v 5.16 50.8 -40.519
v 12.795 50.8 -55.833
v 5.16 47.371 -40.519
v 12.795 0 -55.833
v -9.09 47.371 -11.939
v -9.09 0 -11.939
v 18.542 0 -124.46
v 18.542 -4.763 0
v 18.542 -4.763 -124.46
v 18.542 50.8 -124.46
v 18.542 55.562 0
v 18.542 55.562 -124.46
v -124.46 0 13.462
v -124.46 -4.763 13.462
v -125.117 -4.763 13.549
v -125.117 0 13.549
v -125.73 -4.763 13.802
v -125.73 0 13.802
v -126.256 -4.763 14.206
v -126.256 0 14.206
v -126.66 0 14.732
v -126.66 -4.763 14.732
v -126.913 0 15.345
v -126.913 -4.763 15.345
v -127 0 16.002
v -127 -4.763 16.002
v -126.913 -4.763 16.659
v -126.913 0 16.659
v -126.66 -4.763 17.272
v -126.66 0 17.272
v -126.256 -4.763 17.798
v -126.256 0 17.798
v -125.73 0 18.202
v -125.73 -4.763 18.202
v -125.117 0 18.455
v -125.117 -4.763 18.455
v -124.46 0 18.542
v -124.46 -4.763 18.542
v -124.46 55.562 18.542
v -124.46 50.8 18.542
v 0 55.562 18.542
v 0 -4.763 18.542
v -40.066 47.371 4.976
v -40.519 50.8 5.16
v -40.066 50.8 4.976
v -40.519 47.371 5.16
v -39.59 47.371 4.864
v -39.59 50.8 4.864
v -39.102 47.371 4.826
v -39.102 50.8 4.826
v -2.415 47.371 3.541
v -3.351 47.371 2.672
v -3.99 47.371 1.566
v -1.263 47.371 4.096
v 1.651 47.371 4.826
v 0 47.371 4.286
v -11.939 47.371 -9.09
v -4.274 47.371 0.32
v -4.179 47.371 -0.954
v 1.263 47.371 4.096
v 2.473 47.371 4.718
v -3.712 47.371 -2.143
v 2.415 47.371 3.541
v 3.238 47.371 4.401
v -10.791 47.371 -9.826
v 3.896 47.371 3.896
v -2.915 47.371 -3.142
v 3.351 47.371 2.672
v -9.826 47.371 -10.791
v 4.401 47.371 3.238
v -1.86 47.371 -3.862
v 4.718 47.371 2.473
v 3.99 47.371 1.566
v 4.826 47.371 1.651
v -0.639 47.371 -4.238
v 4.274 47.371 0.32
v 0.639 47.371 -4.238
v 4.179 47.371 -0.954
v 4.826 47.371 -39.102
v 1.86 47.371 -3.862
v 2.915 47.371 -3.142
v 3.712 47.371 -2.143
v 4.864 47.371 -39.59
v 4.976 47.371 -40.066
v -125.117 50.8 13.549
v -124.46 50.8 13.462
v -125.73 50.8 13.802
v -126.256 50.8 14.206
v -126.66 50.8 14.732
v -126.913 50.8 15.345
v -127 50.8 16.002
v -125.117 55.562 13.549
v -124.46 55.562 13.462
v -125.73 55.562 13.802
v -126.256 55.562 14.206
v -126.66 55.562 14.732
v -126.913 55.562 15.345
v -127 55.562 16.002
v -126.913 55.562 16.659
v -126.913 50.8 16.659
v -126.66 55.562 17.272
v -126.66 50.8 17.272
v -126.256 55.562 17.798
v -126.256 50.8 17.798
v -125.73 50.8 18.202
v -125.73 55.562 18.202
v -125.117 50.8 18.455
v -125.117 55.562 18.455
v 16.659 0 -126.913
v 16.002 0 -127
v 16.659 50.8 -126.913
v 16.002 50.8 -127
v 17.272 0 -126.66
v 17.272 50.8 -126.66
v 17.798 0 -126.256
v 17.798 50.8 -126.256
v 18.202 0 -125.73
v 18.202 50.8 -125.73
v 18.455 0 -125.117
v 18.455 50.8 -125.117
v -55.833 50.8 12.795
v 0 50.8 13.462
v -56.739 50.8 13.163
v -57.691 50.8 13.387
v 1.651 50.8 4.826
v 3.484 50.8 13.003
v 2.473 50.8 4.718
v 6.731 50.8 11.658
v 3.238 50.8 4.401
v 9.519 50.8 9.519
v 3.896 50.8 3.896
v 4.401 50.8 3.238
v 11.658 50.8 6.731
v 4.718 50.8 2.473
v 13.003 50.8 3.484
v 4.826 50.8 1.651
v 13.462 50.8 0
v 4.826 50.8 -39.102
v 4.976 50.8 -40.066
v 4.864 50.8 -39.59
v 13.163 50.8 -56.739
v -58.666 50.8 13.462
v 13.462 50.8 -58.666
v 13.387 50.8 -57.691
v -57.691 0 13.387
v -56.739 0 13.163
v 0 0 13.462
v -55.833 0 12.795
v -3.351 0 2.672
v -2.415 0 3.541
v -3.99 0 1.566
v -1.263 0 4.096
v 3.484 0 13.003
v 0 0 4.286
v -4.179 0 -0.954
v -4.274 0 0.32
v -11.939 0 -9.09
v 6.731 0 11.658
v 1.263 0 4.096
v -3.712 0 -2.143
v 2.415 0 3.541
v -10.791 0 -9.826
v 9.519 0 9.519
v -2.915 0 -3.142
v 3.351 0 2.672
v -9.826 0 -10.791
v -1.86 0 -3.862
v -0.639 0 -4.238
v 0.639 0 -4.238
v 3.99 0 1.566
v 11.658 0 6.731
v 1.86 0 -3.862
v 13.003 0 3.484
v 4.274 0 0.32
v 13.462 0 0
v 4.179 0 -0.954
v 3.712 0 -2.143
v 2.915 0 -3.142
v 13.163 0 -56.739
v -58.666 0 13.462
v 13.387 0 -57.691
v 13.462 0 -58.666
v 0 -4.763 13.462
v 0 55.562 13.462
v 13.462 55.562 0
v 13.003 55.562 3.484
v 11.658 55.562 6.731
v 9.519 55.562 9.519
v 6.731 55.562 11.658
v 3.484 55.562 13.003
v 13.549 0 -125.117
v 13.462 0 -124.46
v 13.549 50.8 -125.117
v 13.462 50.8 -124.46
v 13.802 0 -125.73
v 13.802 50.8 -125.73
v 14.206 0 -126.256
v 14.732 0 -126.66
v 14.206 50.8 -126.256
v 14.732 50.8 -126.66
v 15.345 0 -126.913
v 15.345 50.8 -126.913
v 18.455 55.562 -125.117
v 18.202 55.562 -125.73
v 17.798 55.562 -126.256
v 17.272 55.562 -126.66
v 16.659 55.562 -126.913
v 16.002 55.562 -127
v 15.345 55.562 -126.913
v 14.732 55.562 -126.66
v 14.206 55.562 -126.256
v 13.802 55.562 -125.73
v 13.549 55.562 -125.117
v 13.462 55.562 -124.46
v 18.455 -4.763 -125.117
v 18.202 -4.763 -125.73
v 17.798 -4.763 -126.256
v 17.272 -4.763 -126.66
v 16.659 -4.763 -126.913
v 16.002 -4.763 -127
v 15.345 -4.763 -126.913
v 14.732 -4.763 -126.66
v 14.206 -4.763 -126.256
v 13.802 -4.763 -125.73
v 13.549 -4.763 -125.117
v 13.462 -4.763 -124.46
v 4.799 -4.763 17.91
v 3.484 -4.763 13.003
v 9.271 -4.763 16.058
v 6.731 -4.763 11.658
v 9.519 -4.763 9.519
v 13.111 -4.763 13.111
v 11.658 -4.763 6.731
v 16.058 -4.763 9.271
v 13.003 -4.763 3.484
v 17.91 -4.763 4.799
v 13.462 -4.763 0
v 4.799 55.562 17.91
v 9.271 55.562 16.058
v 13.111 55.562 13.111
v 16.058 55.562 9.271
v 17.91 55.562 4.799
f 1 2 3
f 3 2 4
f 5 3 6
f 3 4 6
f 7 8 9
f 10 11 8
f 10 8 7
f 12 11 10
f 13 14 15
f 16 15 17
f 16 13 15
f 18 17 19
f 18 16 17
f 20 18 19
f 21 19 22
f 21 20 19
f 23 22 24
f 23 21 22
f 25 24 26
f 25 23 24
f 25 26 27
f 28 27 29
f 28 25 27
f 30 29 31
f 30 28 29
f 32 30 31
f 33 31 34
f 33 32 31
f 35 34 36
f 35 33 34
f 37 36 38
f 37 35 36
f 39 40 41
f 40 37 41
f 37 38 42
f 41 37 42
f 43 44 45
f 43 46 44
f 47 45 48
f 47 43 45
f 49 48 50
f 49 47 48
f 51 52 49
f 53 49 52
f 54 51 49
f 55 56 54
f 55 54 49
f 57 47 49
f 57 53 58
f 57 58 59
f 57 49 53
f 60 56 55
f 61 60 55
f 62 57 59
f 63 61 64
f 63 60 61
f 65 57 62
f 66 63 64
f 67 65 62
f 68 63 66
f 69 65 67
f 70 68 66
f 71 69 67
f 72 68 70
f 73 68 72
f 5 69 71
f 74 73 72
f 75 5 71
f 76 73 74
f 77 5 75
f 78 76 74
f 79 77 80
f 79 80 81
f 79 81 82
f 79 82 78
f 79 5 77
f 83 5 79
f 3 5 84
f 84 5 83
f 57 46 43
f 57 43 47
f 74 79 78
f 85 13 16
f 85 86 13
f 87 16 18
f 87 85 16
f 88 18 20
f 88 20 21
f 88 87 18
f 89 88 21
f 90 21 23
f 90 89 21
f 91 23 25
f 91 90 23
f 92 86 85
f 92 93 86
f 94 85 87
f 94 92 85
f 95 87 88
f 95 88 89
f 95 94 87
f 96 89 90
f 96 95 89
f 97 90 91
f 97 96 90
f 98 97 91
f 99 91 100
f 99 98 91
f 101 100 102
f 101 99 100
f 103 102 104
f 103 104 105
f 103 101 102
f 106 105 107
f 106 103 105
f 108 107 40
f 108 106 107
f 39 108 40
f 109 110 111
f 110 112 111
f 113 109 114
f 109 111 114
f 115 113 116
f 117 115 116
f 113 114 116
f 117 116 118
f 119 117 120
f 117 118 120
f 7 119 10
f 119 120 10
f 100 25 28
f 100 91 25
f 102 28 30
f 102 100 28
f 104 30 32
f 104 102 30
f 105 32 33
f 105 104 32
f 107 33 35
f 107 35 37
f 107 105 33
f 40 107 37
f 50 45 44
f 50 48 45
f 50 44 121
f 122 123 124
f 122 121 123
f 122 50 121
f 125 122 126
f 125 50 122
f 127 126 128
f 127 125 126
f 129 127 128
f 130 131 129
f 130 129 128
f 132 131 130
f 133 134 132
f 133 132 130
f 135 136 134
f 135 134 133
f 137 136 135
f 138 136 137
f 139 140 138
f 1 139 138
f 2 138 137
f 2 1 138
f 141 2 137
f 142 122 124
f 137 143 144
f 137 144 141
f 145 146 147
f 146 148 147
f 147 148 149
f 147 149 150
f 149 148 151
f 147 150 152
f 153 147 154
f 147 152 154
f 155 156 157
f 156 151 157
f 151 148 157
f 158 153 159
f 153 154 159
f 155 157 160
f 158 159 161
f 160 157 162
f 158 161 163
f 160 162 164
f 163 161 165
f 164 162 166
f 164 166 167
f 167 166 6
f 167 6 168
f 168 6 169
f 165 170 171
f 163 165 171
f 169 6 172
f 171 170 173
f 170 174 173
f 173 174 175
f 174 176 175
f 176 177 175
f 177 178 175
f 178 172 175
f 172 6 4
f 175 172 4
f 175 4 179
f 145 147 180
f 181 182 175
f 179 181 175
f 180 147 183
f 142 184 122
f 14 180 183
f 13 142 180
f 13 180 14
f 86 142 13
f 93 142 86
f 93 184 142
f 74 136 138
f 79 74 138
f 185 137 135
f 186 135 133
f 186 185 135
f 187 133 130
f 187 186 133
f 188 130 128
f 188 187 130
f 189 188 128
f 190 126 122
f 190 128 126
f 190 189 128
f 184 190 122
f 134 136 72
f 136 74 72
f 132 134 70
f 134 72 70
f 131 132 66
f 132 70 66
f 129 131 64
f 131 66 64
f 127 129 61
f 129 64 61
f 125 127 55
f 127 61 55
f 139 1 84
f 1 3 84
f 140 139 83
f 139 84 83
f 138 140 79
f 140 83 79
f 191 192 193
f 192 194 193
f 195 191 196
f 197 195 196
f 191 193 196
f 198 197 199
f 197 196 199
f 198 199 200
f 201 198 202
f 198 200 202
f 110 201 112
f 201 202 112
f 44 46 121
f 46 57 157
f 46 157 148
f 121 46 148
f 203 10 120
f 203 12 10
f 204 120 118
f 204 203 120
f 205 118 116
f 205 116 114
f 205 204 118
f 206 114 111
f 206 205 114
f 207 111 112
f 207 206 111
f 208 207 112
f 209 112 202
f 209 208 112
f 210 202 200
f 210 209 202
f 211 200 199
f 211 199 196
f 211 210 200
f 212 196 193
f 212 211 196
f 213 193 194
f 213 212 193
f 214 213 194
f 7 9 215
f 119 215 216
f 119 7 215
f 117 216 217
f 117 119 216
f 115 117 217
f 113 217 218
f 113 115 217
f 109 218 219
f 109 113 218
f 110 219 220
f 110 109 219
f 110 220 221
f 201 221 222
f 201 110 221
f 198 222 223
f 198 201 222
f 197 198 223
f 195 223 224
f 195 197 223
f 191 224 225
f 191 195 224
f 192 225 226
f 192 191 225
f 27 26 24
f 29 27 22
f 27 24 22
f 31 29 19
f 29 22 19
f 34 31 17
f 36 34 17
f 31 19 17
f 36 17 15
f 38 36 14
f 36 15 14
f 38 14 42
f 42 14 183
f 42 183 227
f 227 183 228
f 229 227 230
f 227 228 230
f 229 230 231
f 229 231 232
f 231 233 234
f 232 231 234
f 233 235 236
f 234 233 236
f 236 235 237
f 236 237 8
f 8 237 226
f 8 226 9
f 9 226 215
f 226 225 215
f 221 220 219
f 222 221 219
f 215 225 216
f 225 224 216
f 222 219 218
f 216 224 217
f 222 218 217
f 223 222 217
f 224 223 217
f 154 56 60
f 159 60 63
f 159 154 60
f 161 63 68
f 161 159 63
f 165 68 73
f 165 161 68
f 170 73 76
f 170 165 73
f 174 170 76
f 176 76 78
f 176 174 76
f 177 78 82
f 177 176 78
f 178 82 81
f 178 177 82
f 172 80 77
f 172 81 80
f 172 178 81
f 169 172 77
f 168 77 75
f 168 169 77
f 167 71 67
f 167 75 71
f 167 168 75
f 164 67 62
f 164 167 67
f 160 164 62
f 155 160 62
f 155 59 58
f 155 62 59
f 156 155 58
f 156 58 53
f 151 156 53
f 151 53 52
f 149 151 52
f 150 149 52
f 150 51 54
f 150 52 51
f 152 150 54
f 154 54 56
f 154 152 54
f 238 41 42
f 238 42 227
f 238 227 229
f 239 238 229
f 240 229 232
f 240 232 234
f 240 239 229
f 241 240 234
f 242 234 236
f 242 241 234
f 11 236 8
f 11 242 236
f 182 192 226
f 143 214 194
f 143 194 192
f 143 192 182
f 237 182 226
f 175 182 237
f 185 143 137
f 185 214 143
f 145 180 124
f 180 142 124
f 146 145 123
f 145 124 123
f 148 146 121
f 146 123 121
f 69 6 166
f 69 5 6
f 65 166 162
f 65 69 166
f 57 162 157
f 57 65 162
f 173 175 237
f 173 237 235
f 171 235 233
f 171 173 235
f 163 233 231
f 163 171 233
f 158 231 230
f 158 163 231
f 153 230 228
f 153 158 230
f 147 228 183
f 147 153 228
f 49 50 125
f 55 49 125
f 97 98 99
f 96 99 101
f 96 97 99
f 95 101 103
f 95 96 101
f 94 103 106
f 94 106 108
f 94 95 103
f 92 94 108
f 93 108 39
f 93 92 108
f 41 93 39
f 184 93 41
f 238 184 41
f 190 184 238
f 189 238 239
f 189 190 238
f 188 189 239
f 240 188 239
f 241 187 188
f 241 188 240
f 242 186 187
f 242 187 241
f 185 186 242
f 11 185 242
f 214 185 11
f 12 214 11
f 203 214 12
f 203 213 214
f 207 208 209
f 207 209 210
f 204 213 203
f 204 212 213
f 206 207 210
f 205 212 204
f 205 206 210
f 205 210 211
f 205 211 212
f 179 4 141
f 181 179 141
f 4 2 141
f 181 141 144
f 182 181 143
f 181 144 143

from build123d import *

# Parameters (mm, degrees)
SKETCH1_R           = 4.28625
BOSS_EXTRUDE1_DEPTH = 50.8
FILLET2_R           = 2.54
SKETCH7_W           = 44.675933609
SKETCH7_H           = 44.675933609
CUT_EXTRUDE3_DEPTH  = 3.429
FILLET9_R           = 3.175
BOSS_EXTRUDE2_DEPTH = 30.1625
FILLET10_R          = 6.35


with BuildPart() as part:
    # Sketch1 → Boss-Extrude1 (new body)
    with BuildSketch(Plane(origin=(0, 0, 0), x_dir=(1, 0, 0), z_dir=(0, 1, 0))):
        with BuildLine():
            Line((13.462, 57.17106993), (-10.037787665, 10.037787665))
            Line((-10.037787665, 10.037787665), (-57.17106993, -13.462))
            Line((-57.17106993, -13.462), (-127, -13.462))
            Line((-127, -13.462), (-127, -18.542))
            Line((-127, -18.542), (0, -18.542))
            ThreePointArc((0, -18.542), (13.111173937, -13.111173937), (18.542, 0))
            Line((18.542, 0), (18.542, 127))
            Line((18.542, 127), (13.462, 127))
            Line((13.462, 127), (13.462, 57.17106993))
        make_face()
        with Locations(Location((0, 0, 0), (0, 0, 270))):
            Circle(SKETCH1_R, mode=Mode.SUBTRACT)
    extrude(amount=BOSS_EXTRUDE1_DEPTH)

    # Fillet2
    fillet2_edges = [part.edges().sort_by_distance(p)[0] for p in [
        (13.462, 25.4, -127),
        (18.542, 25.4, -127),
        (-127, 25.4, 13.462),
        (-127, 25.4, 18.542),
    ]]
    fillet(fillet2_edges, radius=FILLET2_R - 0.0001)  # a hair under: the kernel refuses the full size

    # Sketch7 → Cut-Extrude3 (cut)
    with BuildSketch(Plane(origin=(0, 50.8, 0), x_dir=(1, 0, 0), z_dir=(0, 1, 0))):
        with Locations((-17.511966805, 17.511966805)):
            Rectangle(SKETCH7_W, SKETCH7_H)
    extrude(amount=-CUT_EXTRUDE3_DEPTH, mode=Mode.SUBTRACT)

    # Fillet9
    fillet9_edges = [part.edges().sort_by_distance(p)[0] for p in [
        (4.826, 49.0855, -39.849933609),
        (4.826, 49.0855, 4.826),
        (-39.849933609, 49.0855, 4.826),
    ]]
    fillet(fillet9_edges, radius=FILLET9_R)

    # Sketch8 → Boss-Extrude2 (add, symmetric)
    with BuildSketch(Plane(origin=(0, 25.4, 0), x_dir=(1, 0, 0), z_dir=(0, 1, 0))):
        with BuildLine():
            Line((0, -13.462), (-124.46, -13.462))
            ThreePointArc((-124.46, -13.462), (-126.256051224, -14.205948776), (-127, -16.002))
            ThreePointArc((-127, -16.002), (-126.256051224, -17.798051224), (-124.46, -18.542))
            Line((-124.46, -18.542), (0, -18.542))
            ThreePointArc((0, -18.542), (13.111173937, -13.111173937), (18.542, 0))
            Line((18.542, 0), (18.542, 124.46))
            ThreePointArc((18.542, 124.46), (17.798051224, 126.256051224), (16.002, 127))
            ThreePointArc((16.002, 127), (14.205948776, 126.256051224), (13.462, 124.46))
            Line((13.462, 124.46), (13.462, 0))
            ThreePointArc((13.462, 0), (9.519071488, -9.519071488), (0, -13.462))
        make_face()
    extrude(amount=BOSS_EXTRUDE2_DEPTH, both=True)

    # Fillet10
    fillet10_edges = [part.edges().sort_by_distance(p)[0] for p in [
        (13.462, 25.4, -57.17106993),
        (-57.17106993, 25.4, 13.462),
        (-10.037787665, 23.6855, -10.037787665),
    ]]
    fillet(fillet10_edges, radius=FILLET10_R)


solid = part.part
